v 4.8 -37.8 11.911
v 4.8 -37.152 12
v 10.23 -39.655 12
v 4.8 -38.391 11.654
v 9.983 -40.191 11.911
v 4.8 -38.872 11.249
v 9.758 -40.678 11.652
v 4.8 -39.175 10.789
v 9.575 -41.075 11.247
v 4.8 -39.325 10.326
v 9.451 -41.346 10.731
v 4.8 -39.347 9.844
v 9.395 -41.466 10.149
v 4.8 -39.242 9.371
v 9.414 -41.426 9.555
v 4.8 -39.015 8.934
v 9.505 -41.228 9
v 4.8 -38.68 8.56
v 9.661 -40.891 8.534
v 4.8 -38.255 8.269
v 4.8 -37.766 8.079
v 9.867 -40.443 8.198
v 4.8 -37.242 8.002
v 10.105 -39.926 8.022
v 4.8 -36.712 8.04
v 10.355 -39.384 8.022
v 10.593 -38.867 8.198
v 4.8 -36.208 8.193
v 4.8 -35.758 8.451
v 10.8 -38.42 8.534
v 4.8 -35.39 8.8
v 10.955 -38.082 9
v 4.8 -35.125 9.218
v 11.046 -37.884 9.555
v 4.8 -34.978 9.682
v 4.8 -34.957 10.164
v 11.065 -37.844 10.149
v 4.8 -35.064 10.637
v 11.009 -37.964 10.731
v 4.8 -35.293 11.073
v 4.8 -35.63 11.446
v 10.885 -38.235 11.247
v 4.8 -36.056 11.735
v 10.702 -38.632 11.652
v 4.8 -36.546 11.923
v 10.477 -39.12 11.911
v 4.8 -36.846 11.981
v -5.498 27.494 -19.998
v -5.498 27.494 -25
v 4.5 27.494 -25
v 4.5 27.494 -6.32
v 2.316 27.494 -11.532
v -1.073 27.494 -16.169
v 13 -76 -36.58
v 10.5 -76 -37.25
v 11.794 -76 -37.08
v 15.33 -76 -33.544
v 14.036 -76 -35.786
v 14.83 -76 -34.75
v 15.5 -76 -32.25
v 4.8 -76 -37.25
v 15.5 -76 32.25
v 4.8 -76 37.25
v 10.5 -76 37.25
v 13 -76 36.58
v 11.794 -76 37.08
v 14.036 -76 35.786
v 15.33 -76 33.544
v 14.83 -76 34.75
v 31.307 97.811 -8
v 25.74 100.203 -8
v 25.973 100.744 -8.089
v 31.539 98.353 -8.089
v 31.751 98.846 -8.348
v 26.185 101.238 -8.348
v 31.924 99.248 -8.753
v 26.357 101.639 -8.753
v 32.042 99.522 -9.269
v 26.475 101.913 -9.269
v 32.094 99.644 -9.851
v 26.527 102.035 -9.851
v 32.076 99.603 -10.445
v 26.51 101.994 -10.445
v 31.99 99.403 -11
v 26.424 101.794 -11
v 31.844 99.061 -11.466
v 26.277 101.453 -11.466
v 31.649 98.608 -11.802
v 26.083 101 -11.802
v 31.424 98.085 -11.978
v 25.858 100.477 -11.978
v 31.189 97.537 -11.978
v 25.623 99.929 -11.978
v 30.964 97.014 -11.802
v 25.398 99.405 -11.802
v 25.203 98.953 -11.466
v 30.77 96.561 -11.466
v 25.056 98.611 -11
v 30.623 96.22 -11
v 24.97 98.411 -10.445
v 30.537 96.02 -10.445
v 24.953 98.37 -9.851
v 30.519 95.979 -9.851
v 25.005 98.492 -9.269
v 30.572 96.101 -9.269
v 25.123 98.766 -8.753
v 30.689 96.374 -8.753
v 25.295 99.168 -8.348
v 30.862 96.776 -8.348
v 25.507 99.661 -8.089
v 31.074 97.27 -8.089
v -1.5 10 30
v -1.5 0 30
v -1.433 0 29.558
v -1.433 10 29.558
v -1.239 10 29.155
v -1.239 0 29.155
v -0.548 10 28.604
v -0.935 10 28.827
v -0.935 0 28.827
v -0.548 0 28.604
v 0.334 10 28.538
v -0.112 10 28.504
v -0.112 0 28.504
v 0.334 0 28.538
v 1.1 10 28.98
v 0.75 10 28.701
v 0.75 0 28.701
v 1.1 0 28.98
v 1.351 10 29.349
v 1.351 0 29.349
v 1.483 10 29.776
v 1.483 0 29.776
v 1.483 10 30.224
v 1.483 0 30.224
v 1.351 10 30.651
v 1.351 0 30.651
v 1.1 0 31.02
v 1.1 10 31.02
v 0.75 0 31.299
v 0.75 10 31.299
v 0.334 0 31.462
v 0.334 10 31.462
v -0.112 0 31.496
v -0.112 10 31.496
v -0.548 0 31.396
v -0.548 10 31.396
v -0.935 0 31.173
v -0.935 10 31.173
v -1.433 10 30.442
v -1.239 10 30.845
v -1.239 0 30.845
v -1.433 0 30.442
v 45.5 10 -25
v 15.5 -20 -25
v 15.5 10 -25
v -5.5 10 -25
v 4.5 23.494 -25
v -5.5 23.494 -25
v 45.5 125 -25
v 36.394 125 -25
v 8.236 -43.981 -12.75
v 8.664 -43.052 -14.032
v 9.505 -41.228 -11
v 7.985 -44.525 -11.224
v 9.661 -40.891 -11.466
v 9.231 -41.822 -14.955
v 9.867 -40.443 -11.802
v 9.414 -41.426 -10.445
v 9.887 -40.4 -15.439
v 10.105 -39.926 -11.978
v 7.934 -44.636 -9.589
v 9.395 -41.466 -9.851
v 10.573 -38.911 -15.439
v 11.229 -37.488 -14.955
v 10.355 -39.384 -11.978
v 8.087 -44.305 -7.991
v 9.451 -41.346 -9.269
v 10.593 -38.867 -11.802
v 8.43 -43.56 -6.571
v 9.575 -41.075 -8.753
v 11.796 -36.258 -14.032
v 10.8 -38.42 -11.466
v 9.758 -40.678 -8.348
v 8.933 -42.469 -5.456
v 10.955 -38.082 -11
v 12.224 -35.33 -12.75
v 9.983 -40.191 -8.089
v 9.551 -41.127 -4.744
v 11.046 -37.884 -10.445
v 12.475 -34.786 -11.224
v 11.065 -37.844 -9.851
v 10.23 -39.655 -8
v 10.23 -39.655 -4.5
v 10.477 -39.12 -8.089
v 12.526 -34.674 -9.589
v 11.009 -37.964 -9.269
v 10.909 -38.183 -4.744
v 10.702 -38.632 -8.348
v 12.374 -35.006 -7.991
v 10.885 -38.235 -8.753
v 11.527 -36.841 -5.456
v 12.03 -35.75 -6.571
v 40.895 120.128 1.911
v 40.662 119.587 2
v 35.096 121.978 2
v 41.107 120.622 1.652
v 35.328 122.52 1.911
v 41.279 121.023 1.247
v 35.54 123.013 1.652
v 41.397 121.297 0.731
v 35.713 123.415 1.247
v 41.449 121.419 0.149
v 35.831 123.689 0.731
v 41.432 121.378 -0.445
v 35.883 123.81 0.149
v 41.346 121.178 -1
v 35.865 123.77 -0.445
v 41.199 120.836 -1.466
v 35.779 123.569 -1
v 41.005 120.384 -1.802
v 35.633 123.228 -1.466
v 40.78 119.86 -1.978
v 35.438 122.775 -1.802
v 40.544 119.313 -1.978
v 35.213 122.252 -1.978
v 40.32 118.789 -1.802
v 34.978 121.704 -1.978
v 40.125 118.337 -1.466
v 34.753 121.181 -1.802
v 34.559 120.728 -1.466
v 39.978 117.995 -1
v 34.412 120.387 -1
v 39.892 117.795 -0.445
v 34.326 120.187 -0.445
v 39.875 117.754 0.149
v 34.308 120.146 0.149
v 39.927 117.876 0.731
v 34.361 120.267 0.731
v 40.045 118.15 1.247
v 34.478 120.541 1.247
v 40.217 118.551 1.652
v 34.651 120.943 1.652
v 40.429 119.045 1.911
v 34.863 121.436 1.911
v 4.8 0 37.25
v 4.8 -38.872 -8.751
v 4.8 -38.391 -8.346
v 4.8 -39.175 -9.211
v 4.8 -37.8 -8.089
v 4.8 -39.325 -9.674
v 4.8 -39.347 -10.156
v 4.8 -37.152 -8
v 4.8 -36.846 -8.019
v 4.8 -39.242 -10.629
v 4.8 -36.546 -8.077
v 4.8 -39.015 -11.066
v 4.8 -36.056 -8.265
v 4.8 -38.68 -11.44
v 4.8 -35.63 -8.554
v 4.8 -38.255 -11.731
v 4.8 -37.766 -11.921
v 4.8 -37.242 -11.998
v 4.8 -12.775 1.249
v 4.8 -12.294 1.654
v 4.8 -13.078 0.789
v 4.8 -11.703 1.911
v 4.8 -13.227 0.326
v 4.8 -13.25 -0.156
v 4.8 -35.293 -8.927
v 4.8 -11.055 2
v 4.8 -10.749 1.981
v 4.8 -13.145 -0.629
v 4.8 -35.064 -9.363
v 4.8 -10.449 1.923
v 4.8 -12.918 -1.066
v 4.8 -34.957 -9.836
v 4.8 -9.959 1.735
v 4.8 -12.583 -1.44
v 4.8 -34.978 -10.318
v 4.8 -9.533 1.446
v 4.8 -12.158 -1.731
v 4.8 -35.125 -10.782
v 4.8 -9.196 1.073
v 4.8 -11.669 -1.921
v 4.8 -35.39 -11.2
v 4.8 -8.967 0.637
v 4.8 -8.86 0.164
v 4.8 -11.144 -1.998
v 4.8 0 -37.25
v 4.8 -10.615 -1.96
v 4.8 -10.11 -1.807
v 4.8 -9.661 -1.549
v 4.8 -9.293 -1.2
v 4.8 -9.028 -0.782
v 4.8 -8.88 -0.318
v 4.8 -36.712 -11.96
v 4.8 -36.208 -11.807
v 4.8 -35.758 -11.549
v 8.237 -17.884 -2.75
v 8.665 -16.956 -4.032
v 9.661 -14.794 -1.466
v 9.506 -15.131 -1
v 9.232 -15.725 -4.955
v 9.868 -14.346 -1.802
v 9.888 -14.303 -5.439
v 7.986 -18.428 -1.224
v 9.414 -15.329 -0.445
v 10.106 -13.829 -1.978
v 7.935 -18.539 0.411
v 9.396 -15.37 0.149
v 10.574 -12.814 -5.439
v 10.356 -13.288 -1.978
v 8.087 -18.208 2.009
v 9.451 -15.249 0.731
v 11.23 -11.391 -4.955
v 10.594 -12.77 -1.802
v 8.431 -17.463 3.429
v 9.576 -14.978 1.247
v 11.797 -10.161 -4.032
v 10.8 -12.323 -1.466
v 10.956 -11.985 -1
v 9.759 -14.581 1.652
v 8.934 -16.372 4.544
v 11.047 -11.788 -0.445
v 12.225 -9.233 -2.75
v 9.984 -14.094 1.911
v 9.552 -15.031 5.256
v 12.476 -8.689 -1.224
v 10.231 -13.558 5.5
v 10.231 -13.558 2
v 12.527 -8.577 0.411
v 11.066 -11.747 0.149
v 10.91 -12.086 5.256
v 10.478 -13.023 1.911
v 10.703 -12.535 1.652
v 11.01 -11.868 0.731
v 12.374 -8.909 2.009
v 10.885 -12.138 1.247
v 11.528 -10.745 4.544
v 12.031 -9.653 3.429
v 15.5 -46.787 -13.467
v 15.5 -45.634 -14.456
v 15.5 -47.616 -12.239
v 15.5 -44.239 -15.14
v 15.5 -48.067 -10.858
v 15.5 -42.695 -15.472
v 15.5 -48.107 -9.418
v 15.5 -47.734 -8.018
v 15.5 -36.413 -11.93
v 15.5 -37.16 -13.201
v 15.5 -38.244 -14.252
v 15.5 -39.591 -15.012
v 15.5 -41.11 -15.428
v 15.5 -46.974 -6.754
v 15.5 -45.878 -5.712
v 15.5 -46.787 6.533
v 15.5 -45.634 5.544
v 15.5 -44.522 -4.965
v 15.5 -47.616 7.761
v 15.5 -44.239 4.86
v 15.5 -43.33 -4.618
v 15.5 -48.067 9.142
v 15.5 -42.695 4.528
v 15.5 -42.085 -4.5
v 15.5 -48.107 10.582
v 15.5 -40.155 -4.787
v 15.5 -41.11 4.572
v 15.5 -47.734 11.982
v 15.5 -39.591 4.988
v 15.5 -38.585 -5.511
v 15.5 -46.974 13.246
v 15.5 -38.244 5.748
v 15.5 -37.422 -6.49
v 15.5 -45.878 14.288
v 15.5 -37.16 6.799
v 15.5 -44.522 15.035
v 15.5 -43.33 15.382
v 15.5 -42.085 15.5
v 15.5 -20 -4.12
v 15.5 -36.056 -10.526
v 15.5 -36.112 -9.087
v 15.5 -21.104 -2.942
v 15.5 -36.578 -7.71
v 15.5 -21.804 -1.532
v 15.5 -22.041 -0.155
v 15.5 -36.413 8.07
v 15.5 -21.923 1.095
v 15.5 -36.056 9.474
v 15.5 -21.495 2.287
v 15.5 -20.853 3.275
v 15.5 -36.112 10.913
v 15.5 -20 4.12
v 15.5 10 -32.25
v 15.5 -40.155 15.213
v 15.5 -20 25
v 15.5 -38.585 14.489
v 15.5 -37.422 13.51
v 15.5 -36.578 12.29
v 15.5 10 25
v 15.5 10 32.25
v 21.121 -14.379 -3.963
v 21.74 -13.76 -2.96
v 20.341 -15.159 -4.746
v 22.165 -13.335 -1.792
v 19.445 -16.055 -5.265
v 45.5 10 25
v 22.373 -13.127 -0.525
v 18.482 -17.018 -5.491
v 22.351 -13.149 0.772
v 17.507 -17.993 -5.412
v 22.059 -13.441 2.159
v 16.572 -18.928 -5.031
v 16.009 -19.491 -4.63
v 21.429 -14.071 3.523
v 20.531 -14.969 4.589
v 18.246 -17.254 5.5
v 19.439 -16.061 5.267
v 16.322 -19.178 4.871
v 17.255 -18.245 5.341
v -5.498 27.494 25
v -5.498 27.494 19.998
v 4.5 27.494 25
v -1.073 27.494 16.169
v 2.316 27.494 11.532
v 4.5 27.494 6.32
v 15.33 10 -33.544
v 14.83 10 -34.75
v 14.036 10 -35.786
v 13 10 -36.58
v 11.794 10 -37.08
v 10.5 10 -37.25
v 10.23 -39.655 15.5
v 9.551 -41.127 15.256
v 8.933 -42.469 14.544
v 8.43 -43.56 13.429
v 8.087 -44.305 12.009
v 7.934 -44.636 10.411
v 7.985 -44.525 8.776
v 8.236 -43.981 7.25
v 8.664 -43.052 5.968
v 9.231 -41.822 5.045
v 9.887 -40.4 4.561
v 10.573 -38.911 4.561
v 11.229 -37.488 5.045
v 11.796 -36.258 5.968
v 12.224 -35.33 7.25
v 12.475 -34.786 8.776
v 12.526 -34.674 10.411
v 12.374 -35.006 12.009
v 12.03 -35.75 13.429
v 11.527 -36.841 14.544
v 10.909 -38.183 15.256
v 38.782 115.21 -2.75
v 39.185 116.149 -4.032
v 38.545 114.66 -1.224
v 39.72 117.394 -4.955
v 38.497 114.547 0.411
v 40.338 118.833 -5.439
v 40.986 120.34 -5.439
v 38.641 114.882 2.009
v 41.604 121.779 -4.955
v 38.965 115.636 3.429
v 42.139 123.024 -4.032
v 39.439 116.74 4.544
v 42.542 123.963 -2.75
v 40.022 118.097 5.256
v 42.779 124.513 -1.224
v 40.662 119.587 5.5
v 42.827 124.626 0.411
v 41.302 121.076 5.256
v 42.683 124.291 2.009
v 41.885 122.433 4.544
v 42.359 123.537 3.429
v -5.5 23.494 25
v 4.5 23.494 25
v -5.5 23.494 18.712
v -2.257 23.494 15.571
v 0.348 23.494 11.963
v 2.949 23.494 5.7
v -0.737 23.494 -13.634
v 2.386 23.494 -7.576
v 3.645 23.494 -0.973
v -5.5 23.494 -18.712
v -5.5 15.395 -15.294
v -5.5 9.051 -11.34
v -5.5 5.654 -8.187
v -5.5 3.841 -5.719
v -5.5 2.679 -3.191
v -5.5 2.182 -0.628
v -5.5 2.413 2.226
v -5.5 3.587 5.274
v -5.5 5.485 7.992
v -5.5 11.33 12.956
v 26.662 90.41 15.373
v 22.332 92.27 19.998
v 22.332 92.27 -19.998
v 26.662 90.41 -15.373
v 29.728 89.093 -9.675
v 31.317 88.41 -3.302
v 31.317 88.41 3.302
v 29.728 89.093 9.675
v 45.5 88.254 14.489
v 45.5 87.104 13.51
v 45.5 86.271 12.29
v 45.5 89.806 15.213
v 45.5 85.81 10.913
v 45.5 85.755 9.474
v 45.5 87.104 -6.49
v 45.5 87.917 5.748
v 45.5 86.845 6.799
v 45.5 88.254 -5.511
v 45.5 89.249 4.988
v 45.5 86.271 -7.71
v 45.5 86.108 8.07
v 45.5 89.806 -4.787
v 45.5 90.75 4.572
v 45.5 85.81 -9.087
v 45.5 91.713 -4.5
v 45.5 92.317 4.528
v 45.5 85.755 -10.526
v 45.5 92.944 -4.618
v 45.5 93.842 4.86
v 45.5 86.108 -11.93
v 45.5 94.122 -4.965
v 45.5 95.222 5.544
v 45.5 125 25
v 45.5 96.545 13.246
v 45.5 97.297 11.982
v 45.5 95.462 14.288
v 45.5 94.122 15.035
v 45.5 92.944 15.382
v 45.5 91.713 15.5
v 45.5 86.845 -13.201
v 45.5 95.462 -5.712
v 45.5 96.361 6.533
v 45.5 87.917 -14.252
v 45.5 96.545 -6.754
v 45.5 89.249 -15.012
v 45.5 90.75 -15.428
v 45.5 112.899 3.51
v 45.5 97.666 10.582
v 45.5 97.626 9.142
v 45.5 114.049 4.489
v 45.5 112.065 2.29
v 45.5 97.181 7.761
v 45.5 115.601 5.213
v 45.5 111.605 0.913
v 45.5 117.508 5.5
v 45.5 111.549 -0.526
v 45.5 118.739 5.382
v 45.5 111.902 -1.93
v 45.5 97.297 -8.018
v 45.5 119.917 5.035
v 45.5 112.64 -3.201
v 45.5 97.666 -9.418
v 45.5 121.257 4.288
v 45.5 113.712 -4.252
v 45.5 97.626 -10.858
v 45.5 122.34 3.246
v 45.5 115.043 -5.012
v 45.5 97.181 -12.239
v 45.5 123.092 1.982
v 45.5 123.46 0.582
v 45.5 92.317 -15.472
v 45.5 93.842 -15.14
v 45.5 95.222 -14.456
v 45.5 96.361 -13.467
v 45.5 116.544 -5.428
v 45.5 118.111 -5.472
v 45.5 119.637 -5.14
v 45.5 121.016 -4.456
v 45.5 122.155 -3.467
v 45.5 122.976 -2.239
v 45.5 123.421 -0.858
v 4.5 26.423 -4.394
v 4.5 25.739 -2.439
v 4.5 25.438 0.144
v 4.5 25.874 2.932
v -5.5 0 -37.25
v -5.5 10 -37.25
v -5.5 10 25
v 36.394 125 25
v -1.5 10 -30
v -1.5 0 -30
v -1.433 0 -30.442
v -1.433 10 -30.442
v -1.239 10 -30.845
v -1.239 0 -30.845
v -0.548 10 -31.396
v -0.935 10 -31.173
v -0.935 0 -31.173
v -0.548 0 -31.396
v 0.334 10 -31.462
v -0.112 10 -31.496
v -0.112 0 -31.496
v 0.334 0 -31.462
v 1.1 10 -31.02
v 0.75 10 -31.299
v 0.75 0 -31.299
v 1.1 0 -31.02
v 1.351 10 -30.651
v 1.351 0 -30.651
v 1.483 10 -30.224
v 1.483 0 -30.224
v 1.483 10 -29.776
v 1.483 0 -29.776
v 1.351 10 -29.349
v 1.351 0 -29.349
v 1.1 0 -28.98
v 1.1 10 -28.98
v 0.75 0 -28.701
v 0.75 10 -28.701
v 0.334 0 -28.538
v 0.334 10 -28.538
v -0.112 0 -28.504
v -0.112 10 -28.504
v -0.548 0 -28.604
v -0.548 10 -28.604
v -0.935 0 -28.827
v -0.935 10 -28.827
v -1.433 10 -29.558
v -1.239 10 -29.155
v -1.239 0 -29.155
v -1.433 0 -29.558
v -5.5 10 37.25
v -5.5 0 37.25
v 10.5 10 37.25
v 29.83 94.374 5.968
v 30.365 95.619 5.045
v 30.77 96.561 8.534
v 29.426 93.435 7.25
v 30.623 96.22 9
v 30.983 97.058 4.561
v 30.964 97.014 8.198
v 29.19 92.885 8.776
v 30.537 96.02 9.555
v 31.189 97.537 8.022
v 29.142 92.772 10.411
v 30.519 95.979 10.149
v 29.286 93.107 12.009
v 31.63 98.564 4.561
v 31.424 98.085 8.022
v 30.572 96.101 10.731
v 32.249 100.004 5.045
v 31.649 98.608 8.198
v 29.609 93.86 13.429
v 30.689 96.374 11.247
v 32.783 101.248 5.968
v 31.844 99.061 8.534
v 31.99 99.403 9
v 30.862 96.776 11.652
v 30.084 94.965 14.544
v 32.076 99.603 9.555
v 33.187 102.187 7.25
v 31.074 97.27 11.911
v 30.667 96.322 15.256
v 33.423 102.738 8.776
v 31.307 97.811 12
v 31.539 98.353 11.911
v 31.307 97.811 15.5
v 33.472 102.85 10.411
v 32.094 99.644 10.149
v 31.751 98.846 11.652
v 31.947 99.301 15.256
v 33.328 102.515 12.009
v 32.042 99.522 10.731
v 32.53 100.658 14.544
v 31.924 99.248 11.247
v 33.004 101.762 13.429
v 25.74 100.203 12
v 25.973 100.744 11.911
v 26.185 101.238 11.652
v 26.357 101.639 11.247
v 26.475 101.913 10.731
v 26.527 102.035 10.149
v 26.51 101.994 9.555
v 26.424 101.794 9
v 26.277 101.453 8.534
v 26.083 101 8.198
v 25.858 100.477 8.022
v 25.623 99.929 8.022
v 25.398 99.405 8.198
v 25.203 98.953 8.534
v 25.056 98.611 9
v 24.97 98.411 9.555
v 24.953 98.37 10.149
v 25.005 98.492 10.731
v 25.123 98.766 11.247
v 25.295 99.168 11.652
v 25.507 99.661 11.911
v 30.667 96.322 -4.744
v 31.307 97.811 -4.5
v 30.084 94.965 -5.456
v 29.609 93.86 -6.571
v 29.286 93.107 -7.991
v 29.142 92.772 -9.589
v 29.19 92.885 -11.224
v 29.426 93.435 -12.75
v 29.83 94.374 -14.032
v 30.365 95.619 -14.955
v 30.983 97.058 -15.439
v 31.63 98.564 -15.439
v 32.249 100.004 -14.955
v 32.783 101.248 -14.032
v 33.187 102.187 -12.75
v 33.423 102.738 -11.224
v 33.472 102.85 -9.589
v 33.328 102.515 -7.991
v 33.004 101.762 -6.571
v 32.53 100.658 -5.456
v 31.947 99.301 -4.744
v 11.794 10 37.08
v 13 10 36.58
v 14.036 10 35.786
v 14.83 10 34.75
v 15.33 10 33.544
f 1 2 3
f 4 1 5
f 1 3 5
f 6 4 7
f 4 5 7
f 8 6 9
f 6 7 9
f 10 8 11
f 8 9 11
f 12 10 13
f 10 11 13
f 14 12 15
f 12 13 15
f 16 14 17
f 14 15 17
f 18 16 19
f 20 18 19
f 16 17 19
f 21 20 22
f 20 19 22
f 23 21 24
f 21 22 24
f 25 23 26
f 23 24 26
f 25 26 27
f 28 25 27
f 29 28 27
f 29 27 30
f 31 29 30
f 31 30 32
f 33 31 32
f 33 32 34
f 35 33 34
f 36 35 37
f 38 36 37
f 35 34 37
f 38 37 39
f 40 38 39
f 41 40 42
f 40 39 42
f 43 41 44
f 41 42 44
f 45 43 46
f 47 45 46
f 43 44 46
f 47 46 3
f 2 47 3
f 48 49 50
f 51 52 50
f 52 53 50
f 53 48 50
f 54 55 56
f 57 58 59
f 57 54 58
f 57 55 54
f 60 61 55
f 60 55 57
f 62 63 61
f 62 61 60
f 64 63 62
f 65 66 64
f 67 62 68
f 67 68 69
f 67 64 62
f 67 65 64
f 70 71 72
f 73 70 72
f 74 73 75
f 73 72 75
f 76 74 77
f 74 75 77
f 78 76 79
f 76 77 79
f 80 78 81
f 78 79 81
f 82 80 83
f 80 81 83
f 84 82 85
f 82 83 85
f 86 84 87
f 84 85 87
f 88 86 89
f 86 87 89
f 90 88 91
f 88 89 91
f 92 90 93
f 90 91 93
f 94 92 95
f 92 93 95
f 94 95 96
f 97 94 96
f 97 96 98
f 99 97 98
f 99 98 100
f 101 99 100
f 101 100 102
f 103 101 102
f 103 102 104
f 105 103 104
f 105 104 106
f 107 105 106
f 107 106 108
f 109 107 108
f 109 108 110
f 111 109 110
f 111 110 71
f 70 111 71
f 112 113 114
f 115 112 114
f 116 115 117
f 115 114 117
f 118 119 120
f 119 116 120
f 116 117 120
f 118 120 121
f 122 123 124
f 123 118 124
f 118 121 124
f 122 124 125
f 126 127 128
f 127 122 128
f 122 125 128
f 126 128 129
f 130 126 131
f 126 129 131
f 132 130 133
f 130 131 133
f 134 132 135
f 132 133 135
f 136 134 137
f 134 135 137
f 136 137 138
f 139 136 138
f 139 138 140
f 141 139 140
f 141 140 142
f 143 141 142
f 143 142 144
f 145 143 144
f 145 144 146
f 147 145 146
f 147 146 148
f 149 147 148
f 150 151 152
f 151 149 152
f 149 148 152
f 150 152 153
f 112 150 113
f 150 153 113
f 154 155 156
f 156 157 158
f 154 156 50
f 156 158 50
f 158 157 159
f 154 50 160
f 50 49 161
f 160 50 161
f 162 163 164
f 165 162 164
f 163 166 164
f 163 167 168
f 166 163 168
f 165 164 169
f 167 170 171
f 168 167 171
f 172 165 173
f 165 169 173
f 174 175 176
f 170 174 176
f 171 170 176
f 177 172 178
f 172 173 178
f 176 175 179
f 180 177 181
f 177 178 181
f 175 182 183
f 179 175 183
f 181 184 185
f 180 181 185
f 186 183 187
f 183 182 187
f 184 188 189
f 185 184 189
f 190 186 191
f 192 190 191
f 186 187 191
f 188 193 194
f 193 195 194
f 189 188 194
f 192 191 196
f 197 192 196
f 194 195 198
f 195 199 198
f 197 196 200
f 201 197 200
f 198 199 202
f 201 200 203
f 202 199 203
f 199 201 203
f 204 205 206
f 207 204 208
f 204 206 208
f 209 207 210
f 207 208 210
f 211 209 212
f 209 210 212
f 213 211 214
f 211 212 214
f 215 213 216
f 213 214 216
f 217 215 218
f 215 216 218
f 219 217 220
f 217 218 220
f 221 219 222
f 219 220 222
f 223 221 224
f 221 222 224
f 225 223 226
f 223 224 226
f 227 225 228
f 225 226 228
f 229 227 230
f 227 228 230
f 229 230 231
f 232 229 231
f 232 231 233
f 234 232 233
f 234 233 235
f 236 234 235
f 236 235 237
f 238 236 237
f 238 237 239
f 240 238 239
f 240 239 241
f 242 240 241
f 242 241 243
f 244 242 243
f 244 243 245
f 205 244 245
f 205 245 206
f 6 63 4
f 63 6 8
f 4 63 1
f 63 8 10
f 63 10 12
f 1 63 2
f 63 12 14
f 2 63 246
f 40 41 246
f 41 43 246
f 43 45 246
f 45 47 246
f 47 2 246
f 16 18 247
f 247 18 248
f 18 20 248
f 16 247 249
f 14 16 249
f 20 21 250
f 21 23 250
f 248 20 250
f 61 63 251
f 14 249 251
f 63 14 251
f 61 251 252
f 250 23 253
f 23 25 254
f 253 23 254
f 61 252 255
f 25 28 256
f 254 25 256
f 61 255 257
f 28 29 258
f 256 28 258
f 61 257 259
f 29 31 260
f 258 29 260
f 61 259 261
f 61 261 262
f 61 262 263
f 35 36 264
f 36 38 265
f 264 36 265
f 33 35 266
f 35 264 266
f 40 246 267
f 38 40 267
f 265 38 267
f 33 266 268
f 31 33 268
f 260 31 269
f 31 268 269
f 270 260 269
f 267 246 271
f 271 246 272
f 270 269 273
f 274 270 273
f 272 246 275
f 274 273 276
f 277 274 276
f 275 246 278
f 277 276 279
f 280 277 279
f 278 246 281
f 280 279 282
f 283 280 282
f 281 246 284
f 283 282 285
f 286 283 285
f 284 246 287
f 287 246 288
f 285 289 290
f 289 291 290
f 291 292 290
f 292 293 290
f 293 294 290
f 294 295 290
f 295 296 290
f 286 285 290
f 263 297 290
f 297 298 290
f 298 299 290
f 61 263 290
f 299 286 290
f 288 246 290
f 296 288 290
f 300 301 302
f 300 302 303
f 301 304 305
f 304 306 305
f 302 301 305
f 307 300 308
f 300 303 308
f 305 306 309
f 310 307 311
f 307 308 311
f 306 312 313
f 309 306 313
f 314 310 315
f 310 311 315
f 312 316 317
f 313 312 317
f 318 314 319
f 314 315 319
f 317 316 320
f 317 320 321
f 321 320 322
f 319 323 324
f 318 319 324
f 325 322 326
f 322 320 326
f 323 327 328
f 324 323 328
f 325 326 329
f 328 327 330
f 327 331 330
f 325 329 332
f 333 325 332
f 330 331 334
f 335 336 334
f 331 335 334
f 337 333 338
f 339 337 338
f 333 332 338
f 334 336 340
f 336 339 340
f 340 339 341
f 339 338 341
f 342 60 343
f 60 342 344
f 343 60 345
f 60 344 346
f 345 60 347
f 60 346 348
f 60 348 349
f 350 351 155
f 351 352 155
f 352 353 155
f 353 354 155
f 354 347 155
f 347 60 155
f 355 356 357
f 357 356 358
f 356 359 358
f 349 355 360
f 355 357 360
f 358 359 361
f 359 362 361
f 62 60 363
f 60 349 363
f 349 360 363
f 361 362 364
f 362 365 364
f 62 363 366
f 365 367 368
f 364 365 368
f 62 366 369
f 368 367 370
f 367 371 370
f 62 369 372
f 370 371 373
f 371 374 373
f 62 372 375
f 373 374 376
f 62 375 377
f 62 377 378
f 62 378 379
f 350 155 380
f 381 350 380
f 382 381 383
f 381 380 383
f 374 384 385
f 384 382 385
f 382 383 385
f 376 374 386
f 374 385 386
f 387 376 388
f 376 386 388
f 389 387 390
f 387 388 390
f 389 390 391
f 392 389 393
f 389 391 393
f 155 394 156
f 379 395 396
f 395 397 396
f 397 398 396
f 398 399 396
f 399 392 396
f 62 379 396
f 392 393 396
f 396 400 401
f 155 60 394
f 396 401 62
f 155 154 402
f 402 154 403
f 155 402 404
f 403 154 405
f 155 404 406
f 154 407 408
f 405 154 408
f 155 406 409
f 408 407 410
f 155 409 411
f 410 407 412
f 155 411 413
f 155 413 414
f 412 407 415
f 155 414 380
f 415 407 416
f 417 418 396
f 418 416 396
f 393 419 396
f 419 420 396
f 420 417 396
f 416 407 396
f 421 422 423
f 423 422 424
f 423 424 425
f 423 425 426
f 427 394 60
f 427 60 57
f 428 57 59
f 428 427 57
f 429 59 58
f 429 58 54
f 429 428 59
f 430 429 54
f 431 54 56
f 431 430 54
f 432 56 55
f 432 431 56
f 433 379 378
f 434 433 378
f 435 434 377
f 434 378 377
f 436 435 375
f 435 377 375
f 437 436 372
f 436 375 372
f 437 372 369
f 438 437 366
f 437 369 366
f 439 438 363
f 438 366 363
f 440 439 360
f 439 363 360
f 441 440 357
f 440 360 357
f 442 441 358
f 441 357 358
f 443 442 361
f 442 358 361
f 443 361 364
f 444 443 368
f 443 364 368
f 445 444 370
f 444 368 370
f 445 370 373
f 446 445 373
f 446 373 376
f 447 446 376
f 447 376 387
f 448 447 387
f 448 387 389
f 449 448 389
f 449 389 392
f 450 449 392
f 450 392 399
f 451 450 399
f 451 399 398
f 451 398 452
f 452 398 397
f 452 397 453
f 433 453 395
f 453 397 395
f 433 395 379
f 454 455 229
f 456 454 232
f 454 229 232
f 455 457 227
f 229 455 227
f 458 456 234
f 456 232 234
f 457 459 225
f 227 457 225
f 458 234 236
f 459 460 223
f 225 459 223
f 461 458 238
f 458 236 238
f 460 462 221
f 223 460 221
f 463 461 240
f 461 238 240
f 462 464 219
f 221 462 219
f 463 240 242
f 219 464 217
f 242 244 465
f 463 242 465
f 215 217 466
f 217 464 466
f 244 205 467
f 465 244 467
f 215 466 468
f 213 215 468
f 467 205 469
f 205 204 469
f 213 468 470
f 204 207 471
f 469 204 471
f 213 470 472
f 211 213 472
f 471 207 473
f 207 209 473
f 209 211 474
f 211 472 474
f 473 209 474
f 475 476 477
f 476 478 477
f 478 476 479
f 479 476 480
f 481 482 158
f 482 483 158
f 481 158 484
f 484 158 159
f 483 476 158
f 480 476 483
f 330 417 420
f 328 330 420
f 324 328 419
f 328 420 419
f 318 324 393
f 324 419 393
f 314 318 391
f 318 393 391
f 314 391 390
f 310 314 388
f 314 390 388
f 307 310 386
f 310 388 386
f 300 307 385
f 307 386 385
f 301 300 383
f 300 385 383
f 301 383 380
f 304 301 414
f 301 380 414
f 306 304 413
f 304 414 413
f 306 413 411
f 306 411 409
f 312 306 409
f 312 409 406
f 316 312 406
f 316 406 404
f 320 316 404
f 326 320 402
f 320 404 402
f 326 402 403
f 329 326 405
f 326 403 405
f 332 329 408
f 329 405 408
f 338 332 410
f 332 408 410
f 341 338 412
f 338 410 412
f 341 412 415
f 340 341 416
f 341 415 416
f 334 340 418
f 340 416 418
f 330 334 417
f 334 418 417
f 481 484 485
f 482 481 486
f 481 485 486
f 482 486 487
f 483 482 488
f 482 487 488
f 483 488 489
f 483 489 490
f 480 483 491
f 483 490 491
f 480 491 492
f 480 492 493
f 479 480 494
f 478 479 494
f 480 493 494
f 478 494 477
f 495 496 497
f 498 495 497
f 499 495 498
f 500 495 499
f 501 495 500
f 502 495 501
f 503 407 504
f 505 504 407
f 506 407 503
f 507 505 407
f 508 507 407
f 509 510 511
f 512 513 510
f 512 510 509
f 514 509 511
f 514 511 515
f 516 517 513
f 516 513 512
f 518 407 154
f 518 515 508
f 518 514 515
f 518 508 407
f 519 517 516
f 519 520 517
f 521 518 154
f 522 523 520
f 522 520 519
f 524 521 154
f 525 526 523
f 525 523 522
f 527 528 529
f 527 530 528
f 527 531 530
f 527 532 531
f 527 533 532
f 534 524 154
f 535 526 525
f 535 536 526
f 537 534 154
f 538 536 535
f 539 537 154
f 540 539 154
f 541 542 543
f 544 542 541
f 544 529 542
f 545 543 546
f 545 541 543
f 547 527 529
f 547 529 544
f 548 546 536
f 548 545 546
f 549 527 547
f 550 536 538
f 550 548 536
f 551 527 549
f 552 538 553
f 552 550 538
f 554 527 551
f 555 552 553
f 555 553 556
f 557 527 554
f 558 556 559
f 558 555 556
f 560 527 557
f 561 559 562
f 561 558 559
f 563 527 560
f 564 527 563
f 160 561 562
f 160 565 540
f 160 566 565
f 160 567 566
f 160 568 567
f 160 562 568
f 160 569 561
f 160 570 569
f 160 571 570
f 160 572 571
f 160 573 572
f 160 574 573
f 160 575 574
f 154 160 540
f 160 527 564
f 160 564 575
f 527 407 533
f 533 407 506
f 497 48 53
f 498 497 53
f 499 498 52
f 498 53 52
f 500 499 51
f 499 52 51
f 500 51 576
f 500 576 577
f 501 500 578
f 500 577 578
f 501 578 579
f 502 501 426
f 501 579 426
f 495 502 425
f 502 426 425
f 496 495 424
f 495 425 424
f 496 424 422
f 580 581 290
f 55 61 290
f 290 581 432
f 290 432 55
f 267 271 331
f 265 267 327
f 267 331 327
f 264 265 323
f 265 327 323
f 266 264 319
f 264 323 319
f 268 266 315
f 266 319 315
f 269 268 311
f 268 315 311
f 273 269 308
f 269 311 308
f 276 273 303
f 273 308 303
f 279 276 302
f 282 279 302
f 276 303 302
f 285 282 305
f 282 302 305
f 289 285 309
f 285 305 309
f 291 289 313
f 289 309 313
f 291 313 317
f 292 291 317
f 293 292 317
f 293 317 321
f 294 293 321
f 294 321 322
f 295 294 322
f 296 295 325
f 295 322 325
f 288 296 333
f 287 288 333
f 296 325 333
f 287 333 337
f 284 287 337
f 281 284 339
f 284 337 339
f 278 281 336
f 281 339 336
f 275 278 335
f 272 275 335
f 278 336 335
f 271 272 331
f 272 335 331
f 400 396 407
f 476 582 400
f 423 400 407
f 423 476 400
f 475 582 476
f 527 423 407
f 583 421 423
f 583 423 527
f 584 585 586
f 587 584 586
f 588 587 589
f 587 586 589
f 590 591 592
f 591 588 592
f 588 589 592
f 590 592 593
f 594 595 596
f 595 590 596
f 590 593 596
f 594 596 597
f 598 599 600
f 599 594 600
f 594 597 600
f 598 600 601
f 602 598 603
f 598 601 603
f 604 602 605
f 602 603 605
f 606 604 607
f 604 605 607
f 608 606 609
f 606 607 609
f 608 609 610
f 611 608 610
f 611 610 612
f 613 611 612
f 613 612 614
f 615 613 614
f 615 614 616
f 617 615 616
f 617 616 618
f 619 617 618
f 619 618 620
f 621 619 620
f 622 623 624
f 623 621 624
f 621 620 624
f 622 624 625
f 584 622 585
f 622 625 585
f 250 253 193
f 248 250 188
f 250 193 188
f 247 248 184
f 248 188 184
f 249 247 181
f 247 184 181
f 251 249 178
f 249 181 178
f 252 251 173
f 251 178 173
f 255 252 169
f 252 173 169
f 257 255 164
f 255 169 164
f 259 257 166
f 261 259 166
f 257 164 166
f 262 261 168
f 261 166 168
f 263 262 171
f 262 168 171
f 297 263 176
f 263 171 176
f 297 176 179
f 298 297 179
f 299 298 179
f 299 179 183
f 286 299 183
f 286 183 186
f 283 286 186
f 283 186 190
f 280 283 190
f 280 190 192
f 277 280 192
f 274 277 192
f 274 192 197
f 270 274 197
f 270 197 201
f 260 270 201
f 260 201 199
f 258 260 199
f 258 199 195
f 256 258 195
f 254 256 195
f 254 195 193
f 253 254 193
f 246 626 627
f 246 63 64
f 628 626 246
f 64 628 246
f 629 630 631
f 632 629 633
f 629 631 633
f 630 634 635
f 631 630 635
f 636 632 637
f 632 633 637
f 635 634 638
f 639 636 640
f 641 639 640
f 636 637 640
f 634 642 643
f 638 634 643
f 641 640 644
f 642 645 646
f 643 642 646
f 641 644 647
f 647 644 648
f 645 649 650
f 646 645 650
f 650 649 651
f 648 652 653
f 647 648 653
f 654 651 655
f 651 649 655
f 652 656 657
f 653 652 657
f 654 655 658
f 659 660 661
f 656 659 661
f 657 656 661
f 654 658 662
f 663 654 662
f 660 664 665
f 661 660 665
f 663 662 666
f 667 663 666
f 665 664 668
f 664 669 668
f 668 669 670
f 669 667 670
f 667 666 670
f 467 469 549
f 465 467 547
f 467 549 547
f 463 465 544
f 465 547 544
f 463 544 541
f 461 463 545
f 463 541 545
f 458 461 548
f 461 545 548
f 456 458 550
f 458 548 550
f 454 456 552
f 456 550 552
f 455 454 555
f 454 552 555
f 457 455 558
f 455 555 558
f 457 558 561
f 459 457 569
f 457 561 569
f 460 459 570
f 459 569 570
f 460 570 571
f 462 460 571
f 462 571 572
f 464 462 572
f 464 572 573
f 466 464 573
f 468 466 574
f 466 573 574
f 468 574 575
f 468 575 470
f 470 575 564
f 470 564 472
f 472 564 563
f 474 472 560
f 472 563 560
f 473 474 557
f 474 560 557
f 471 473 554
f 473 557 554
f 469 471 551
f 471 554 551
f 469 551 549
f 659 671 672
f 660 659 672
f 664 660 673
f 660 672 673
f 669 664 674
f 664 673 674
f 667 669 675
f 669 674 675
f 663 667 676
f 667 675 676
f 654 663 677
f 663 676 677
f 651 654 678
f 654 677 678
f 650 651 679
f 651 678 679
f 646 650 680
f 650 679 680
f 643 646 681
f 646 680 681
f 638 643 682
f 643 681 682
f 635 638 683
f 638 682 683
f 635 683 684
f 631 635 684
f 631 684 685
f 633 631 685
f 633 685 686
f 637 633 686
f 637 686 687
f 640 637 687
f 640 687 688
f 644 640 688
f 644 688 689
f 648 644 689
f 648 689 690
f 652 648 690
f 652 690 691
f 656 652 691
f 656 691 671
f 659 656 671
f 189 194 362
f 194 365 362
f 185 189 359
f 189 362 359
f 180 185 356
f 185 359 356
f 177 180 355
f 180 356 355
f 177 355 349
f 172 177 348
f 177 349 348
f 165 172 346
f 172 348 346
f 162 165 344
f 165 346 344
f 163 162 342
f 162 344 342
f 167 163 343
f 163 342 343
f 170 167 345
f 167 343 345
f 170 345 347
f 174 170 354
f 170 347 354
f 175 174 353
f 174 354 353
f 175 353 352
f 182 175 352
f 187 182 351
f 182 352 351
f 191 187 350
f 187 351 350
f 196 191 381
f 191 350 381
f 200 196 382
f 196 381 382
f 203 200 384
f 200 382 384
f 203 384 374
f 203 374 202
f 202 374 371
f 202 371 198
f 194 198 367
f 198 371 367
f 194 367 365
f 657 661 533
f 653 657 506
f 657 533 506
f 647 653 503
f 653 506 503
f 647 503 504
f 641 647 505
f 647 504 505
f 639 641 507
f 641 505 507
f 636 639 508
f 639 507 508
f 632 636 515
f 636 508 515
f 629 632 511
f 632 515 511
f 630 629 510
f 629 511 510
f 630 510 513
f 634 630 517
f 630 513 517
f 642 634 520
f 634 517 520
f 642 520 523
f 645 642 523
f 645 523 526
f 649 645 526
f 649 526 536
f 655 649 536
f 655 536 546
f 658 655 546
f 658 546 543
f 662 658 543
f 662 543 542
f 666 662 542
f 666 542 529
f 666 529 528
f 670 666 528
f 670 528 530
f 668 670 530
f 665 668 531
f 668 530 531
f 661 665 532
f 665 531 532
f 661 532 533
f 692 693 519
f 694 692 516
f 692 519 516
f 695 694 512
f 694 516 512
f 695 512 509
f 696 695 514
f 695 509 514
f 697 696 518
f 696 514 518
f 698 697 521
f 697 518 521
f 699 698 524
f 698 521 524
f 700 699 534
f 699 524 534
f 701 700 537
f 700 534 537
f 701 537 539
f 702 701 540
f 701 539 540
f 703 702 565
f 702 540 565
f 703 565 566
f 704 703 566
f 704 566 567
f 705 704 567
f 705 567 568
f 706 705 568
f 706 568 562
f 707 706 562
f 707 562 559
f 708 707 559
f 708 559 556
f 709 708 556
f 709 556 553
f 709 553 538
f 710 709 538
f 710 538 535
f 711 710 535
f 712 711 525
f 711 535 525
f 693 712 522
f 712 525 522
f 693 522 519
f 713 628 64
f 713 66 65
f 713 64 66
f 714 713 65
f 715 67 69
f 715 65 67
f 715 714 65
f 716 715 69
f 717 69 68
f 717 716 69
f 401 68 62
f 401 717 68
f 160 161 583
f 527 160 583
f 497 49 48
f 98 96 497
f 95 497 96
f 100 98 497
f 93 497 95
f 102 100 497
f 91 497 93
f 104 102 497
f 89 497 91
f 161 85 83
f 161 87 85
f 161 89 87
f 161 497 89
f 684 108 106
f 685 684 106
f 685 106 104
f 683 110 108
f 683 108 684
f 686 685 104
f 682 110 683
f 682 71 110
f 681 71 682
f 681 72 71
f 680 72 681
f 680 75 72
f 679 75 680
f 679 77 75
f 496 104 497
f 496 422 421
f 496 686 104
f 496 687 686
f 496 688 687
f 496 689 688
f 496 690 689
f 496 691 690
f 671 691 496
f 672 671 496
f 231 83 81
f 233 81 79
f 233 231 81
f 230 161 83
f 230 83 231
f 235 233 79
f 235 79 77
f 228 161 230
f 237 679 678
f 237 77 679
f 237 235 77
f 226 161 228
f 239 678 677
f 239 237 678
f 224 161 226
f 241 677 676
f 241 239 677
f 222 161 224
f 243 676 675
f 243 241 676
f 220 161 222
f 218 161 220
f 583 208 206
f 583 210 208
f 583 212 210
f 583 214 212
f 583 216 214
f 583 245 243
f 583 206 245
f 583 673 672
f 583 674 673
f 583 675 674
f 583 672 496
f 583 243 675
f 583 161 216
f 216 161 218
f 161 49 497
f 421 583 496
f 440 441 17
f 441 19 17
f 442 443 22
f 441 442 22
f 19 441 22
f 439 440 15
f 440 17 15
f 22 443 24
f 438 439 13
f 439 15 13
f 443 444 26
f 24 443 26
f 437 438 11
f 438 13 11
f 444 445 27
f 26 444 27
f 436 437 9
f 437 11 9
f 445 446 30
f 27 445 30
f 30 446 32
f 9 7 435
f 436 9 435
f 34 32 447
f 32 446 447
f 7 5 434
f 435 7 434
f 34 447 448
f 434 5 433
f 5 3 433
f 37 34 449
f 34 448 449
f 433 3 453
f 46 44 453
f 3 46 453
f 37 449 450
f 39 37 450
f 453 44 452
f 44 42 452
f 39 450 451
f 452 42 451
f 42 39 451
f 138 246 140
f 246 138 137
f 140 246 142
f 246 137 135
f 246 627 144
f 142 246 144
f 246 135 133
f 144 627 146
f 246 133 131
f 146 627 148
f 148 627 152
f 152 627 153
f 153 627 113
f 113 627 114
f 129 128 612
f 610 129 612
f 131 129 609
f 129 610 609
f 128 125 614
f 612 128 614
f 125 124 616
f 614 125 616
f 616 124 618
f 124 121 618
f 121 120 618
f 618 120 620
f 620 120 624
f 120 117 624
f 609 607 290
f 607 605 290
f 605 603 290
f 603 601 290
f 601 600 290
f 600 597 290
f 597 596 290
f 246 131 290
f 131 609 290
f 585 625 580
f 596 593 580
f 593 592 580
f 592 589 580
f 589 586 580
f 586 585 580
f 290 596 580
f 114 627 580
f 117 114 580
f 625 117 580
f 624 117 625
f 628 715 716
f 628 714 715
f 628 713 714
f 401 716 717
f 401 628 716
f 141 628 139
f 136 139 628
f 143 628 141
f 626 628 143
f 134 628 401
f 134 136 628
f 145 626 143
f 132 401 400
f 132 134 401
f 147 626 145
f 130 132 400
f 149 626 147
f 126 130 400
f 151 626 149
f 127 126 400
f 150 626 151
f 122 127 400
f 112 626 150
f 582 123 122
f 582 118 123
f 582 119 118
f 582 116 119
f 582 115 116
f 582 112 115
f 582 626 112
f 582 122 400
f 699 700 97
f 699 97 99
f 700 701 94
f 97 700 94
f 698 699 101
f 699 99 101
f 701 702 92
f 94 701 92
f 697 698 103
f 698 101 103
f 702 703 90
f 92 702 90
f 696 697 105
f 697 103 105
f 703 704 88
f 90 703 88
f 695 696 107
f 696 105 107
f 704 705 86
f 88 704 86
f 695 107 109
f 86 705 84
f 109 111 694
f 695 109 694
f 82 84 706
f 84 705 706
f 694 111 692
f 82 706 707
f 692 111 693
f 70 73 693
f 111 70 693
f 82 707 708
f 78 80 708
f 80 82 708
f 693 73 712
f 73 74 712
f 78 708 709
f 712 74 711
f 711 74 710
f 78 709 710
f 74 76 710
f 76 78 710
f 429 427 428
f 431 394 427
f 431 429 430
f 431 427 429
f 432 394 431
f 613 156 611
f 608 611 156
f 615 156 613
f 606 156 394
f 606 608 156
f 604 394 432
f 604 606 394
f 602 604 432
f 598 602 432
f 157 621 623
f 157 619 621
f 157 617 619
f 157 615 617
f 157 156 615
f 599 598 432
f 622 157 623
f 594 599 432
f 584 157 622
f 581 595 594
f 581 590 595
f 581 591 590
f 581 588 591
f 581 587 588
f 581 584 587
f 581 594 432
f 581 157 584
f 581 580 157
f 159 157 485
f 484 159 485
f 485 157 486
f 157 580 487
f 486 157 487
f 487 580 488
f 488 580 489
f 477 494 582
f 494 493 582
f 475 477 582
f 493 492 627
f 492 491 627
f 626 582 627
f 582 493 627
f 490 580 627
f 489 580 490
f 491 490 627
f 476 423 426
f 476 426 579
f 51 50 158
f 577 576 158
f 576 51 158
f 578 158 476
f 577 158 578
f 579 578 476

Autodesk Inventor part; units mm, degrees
sketch "Sketch1" plane through (0, 0, 0) normal (0, 1, 0) x (-1, 0, 0)
  line L0 (5.5, 37.25) -> (-5.5, 37.25)
  line L1 (-5.5, 37.25) -> (-5.5, -37.25)
  line L2 (-5.5, -37.25) -> (5.5, -37.25)
  line L3 (5.5, -37.25) -> (5.5, 37.25)
  line L4 (5.5, 37.25) -> (-5.5, -37.25) construction
  line L5 (-5.5, 37.25) -> (5.5, -37.25) construction
  circle A0 centre (0, 30) radius 1.5
  line L6 (5.5, 0) -> (-5.5, 0)
  circle A1 centre (0, -30) radius 1.5
  line L7 (-5.5, -25) -> (5.5, -25)
  line L8 (5.5, -25) -> (5.5, 25)
  line L9 (5.5, 25) -> (-5.5, 25)
  line L10 (-5.5, 25) -> (-5.5, -25)
  line L11 (-5.5, -25) -> (5.5, 25) construction
  line L12 (5.5, -25) -> (-5.5, 25) construction
  point P0 (0, 0)
  dimension "d0" = 11
  dimension "d1" = 74.5
  dimension "d2" = 3
  dimension "d3" = 7.25
  dimension "d28" = 50
extrude "Extrusion1" add sketch "Sketch1" along normal blind 10
sketch "Sketch2" plane through (5.5, 0, 37.25) normal (1, 0, 0) x (0, 0, -1)
  line L0 (0, 10) -> (74.5, 10) projected
  line L1 (0, 0) -> (74.5, 0) projected
  line L2 (0, 10) -> (74.5, 10)
  line L3 (74.5, 10) -> (74.5, 0)
  line L4 (74.5, 0) -> (0, 0)
  line L5 (0, 0) -> (0, 10)
  point P0 (37.25, 0)
extrude "Extrusion2" add sketch "Sketch2" along normal blind 10
sketch "Sketch3" plane through (0, 0, 0) normal (0, -1, 0) x (1, 0, 0)
  line L0 (-5.5, 37.25) -> (15.5, 37.25) projected
  line L1 (-5.5, -37.25) -> (15.5, -37.25) projected
  line L2 (15.5, 37.25) -> (4.8, 37.25)
  line L3 (4.8, 37.25) -> (4.8, -37.25)
  line L4 (4.8, -37.25) -> (15.5, -37.25)
  line L5 (15.5, -37.25) -> (15.5, 37.25)
  point P0 (0, 0)
  dimension "d9" = 10.7
extrude "Extrusion3" add sketch "Sketch3" along normal blind 76
ref_plane "Work Plane1" through (15.5, -76, -37.25) normal (-0.9081432, 0.4186597, 0) x (0, 0, 1)
ref_plane "Work Plane3" through (10.9593, -73.9067, -37.25) normal (-0.9081432, 0.4186597, 0) x (0, 0, 1)
sketch "Sketch4" plane through (10.9593, -73.9067, -37.25) normal (-0.9081432, 0.4186597, 0) x (0, 0, 1)
  circle A0 centre (37.25, 54.5) radius 2
  circle A1 centre (37.25, 54.5) radius 5.5
  circle A2 centre (27.25, 30.8) radius 2
  circle A3 centre (27.25, 30.8) radius 5.5
  line L0 (37.25, 62.5297) -> (37.25, 0)
  line L1 (0, 0) -> (74.5, 0) projected
  circle A4 centre (47.25, 30.8) radius 5.5
  circle A5 centre (47.25, 30.8) radius 2
  point P0 (37.25, 0)
  dimension "d13" = 4
  dimension "d14" = 11
  dimension "d15" = 4
  dimension "d16" = 11
  dimension "d19" = 10
  dimension "d20" = 23.7
  dimension "d23" = 54.5
extrude "Extrusion4" cut sketch "Sketch4" along normal blind 15 contours A0 L0 | A0 L0 A1 | L0 A0 | A0 L0 A1 | A2 | A3 | A4 | A5
extrude "Extrusion11" cut sketch "Sketch4" along normal blind 25.925 contours A0 L0 | A0 L0 A1 | L0 A0 | A0 L0 A1
extrude "Extrusion6" cut sketch "Sketch4" along normal through all contours A0 L0 | L0 A0 | A2 | A5
extrude "Extrusion7" add sketch "Sketch1" along normal blind 125 contours L3 L6 L1 L9 | L3 L7 L1 L6
sketch "Sketch5" plane through (5.5, 10, -25) normal (1, 0, 0) x (0, 0, -1)
  line L0 (0, 115) -> (-50, 115) projected
  line L1 (0, 0) -> (0, 115) projected
  line L2 (-50, 115) -> (0, 115)
  line L3 (0, 115) -> (0, 0)
  line L4 (0, 0) -> (-50, 0)
  line L5 (-50, 0) -> (-50, 115)
  point P0 (-25, -10)
extrude "Extrusion8" add sketch "Sketch5" along normal blind 40
chamfer "Chamfer1" distance 40 angle 23.25 1 edges at (-5.5, 125, 0) measured on face at (-5.5, 48.3333, -8.3333)
sketch "Sketch6" plane through (11.6854, 125, -25) normal (-0.9187912, 0.3947439, 0) x (0, 0, 1)
  circle A0 centre (25, 6.4645) radius 2
  circle A1 centre (25, 6.4645) radius 5.5
  circle A2 centre (15, -17.2355) radius 5.5
  circle A3 centre (15, -17.2355) radius 2
  line L0 (25, 14.6915) -> (25, -47.8381)
  circle A4 centre (35, -17.2355) radius 5.5
  circle A5 centre (35, -17.2355) radius 2
  line L1 (0, -43.5355) -> (50, -43.5355) projected
  point P0 (25, -119.4616)
  point P1 (25, -43.5355)
  point P2 (25, -43.5355)
  dimension "d36" = 4
  dimension "d37" = 11
  dimension "d38" = 4
  dimension "d39" = 11
  dimension "d40" = 10
  dimension "d41" = 23.7
  dimension "d44" = 50
extrude "Extrusion9" cut sketch "Sketch6" against normal through all contours A0 L0 | L0 A0 | A3 | A5
chamfer "Chamfer2" distance 30 distance2 30 1 edges at (15.5, 10, 0)
sketch "Sketch8" plane through (11.6854, 125, -25) normal (-0.9187912, 0.3947439, 0) x (0, 0, 1)
  line L0 (0, 0) -> (0, 13.3481) projected
  line L1 (-12.25, -121.6327) -> (62.25, -121.6327) projected
  line L2 (0, 13.3481) -> (50, 13.3481)
  line L3 (50, 13.3481) -> (50, -121.6327)
  line L4 (50, -121.6327) -> (0, -121.6327)
  line L5 (0, -121.6327) -> (0, 13.3481)
  point P0 (25, -119.4616)
  point P1 (0, 0)
  dimension "d59" = 50
extrude "Extrusion12" cut sketch "Sketch8" against normal blind 22.7
ref_plane "Work Plane4" through (64.6996, 102.2233, -25) normal (-0.9187912, 0.3947439, 0) x (0, 0, 1)
sketch "Sketch9" plane through (64.6996, 102.2233, -25) normal (-0.9187912, 0.3947439, 0) x (0, 0, 1)
  circle A0 centre (35, -17.2355) radius 2 projected
  circle A1 centre (35, -17.2355) radius 5.5
  circle A2 centre (15, -17.2355) radius 2 projected
  circle A3 centre (15, -17.2355) radius 5.5
  circle A4 centre (25, 6.4645) radius 2 projected
  circle A5 centre (25, 6.4645) radius 5.5
  point P0 (25, -119.4616)
  dimension "d63" = 11
  dimension "d64" = 11
  dimension "d65" = 11
extrude "Extrusion13" cut sketch "Sketch9" along normal blind 28.9375 contours A0 | A1 | A2 | A3 | A4 | A5
ref_plane "Work Plane5" through (32.5419, 116.0393, -25) normal (-0.9187912, 0.3947439, 0) x (0, 0, 1)
ref_plane "Work Plane6" through (-5.5, 27.4944, -18.625) normal (0.3947439, 0.9187912, 0) x (0, 0, -1)
sketch "Sketch10" plane through (-5.5, 27.4944, -18.625) normal (0.3947439, 0.9187912, 0) x (0, 0, -1)
  circle A0 centre (-18.625, 15) radius 25
  line L0 (-43.625, 0) -> (6.375, 0) projected
  point P0 (-18.625, -15.9066)
  point P1 (-38.625, 0)
  point P2 (1.375, 0)
  dimension "d70" = 50
  dimension "d71" = 15
extrude "Extrusion14" cut sketch "Sketch10" along normal blind 70.5 and the other way blind 54.3375
sketch "Sketch11" plane through (15.5, 10, -25) normal (0, 0, -1) x (-1, 0, 0)
  line L0 (21, 17.4944) -> (-6.8294, 82.2691) projected
  line L1 (21, 17.4944) -> (11, 17.4944)
  line L2 (11, 17.4944) -> (11, 13.4944)
  line L3 (11, 13.4944) -> (21, 13.4944)
  line L4 (21, 13.4944) -> (21, 17.4944)
  point P0 (15.5, -10)
  dimension "d76" = 10
  dimension "d77" = 4
extrude "Extrusion15" cut sketch "Sketch11" against normal blind 70.5
fillet "Fillet1" radius 5 2 edges at (15.5, -33, 37.25) (15.5, -33, -37.25)
properties part number "Camera Bracket"
